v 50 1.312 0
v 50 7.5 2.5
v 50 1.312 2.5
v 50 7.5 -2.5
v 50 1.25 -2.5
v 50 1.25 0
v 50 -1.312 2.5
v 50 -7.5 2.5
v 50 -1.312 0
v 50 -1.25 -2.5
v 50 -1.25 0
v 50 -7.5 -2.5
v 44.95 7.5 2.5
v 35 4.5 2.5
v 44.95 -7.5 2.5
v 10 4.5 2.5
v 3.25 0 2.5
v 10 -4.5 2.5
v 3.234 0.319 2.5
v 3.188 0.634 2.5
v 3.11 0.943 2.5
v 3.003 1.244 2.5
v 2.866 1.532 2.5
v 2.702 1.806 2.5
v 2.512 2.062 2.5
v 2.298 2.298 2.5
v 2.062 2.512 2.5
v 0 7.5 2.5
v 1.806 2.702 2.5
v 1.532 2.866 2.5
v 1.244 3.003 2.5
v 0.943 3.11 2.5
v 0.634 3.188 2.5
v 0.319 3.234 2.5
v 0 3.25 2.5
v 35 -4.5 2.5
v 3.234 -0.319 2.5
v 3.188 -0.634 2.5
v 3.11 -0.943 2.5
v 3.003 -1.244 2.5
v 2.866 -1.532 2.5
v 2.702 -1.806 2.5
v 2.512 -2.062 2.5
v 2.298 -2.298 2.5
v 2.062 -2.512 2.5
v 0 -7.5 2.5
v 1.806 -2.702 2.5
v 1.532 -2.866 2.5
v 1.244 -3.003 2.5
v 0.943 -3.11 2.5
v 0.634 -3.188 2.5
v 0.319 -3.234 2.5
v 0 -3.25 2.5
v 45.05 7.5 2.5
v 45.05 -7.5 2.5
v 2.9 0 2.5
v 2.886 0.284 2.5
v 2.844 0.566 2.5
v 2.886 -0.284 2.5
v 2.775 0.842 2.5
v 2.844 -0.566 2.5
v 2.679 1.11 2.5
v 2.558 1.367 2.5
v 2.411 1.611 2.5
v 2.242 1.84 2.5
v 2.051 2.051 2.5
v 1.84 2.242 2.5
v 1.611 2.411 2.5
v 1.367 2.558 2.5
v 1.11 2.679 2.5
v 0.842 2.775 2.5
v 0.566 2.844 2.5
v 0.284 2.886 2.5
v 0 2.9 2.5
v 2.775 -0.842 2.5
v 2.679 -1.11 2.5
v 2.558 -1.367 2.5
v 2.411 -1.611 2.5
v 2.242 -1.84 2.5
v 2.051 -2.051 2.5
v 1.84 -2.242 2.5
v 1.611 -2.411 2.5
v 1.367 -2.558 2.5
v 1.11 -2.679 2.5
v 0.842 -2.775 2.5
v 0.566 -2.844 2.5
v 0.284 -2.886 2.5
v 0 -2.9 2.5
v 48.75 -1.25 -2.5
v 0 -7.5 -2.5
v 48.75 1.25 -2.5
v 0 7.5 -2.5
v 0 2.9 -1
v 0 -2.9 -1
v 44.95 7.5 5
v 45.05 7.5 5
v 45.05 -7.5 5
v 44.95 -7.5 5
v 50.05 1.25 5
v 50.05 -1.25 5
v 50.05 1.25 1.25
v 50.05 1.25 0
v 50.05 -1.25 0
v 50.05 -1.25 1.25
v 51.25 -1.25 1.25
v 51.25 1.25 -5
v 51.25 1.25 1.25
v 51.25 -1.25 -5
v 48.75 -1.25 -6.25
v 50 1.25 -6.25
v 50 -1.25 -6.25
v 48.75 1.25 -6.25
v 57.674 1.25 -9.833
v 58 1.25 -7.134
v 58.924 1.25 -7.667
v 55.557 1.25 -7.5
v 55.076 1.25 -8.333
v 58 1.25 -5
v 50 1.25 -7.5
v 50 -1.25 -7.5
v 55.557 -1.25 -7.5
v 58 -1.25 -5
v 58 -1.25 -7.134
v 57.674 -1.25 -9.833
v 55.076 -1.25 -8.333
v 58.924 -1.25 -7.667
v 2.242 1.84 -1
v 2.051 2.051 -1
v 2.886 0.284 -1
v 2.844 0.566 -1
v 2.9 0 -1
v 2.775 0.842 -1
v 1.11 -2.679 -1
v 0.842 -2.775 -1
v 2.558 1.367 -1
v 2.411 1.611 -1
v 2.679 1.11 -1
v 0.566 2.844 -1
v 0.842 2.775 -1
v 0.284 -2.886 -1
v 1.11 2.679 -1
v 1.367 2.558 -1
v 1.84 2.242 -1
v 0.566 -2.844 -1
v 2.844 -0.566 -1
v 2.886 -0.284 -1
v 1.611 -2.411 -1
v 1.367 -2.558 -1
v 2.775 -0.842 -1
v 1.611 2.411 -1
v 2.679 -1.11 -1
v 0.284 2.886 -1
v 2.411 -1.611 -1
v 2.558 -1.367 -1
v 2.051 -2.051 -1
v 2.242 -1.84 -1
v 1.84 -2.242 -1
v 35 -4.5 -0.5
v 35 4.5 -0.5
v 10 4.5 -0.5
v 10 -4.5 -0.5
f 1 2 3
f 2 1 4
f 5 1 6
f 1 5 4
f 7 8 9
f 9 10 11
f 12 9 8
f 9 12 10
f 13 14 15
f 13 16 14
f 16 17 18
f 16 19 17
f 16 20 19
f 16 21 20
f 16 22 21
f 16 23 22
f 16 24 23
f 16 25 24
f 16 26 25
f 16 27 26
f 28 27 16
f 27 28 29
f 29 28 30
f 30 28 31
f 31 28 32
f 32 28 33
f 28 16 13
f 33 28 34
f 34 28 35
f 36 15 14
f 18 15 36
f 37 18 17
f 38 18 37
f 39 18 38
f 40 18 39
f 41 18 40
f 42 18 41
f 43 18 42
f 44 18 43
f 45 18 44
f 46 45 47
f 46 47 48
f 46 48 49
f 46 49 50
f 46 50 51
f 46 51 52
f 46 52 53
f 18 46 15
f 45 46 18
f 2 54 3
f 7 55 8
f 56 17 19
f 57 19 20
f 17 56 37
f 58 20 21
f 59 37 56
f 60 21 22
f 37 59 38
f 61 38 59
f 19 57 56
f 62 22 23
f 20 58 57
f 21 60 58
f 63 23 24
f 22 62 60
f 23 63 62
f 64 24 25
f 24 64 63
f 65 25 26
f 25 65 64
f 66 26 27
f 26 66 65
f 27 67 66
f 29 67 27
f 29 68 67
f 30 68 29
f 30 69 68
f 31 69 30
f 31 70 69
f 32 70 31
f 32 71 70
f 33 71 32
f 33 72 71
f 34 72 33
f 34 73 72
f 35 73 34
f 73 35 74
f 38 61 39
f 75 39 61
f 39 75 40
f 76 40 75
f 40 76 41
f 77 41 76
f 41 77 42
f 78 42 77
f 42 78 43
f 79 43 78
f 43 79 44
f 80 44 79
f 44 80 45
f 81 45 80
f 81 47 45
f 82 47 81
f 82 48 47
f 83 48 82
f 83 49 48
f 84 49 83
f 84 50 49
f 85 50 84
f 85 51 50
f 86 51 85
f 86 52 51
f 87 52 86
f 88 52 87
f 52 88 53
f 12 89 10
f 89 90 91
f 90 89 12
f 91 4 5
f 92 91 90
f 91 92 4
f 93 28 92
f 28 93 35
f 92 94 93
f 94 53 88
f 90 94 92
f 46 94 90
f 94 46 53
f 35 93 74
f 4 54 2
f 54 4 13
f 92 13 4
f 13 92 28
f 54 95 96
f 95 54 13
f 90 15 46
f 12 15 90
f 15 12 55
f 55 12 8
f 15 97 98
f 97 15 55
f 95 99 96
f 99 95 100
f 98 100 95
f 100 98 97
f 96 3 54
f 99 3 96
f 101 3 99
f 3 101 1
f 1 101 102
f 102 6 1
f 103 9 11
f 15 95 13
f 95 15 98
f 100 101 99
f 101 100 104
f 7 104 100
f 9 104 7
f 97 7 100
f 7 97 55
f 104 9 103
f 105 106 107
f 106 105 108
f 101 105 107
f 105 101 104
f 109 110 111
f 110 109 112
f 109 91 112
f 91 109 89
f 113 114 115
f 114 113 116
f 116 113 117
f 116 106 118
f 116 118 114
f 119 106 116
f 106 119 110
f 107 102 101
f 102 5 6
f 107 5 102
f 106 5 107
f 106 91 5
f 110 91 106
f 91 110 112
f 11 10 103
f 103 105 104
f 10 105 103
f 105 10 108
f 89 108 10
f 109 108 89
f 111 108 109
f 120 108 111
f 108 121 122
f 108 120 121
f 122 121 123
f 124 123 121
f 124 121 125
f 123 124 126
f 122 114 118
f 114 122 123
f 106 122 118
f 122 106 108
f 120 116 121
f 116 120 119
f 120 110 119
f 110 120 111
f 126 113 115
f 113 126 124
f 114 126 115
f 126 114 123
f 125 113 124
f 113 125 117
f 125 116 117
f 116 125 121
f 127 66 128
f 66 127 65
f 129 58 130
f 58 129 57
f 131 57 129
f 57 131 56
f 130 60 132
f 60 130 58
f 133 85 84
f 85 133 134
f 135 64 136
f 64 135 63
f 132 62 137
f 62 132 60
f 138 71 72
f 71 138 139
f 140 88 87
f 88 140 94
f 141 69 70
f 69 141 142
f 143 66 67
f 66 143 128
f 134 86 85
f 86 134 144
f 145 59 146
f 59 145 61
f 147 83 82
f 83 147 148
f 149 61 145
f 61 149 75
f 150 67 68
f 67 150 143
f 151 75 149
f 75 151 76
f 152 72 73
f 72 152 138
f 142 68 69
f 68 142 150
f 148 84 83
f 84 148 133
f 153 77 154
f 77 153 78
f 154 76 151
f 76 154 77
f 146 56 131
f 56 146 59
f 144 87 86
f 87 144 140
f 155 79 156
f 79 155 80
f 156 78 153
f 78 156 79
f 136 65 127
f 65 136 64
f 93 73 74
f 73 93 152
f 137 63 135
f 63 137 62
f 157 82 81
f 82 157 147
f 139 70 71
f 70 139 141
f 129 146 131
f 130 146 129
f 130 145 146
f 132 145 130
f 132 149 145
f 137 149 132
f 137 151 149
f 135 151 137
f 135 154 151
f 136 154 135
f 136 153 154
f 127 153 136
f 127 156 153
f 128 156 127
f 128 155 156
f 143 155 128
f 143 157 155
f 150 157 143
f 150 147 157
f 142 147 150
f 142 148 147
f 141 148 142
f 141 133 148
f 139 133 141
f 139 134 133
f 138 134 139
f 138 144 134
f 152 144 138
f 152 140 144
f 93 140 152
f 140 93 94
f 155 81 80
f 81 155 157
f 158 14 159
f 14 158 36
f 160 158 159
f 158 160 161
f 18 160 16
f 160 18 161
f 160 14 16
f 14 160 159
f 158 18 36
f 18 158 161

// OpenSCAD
// 挂钩舵机钩子 — MG996R 直驱
// OpenSCAD 打开此文件 → F6 渲染 → Export STL
// 单位: mm

/* ===== 可调参数 ===== */
HOOK_LENGTH    = 50;    // 钩身总长 (舵机轴心→钩尖)
HOOK_WIDTH     = 15;    // 钩身宽度
HOOK_THICK     = 5;     // 钩身厚度 (平放打印)
TIP_DROP       = 10;    // 钩头下探 (Z轴高低差)
TIP_WIDTH      = 2.5;   // 钩尖宽度 (适配3~4mm从车槽口)
TIP_LENGTH     = 8;     // 钩尖长度 (伸入槽口部分)
CURVE_R        = 5;     // 过渡圆弧半径
SHAFT_DIAM     = 5.8;   // 中心孔径 (略小于舵机轴6mm, 压入咬紧)
SCREW_DIAM     = 3.2;   // M3沉头螺丝孔
SCREW_HEAD_DIAM = 6.5;  // M3沉头直径
SCREW_HEAD_DEPTH = 2.5; // M3沉头深度
$fn            = 64;    // 圆弧精度

/* ===== 主模型 ===== */
module hook() {
    difference() {
        union() {
            // —— 钩身平板 ——
            // 舵机轴心在原点，钩子沿 +X 方向伸出
            translate([HOOK_LENGTH/2, 0, 0])
                cube([HOOK_LENGTH, HOOK_WIDTH, HOOK_THICK], center=true);

            // —— 弧形过渡 (宽度渐变: 15→2.5) ——
            // 用 hull() 连接钩身末端和钩尖起点的椭圆截面
            hull() {
                // 钩身末端 (宽15, 厚5)
                translate([HOOK_LENGTH - CURVE_R, 0, HOOK_THICK/2])
                    cube([0.1, HOOK_WIDTH, HOOK_THICK], center=true);
                // 钩尖起点 (宽2.5, 厚5, 下探开始)
                translate([HOOK_LENGTH, 0, HOOK_THICK/2])
                    cube([0.1, TIP_WIDTH, HOOK_THICK], center=true);
            }

            // —— 钩尖下探 (垂直柱) ——
            translate([HOOK_LENGTH, 0, -TIP_DROP/2 + HOOK_THICK/2])
                cube([TIP_WIDTH, TIP_WIDTH, TIP_DROP - HOOK_THICK/2], center=true);

            // —— 钩尖水平段 (伸入槽口的部分) ——
            translate([HOOK_LENGTH + TIP_LENGTH/2, 0, -TIP_DROP + HOOK_THICK/2 + TIP_WIDTH/2])
                cube([TIP_LENGTH, TIP_WIDTH, TIP_WIDTH], center=true);

            // —— 钩尖回钩 (防滑脱的小倒钩) ——
            translate([HOOK_LENGTH + TIP_LENGTH - 1, 0, -TIP_DROP + HOOK_THICK/2 - 0.5])
                rotate([0, 30, 0])
                    cube([3, TIP_WIDTH, TIP_WIDTH], center=true);
        }

        // —— 中心孔 (舵机轴 φ5.8mm) ——
        translate([0, 0, -1])
            cylinder(d=SHAFT_DIAM, h=HOOK_THICK + 2);

        // —— M3 沉头螺丝孔 (从上表面贯穿) ——
        translate([0, 0, HOOK_THICK - SCREW_HEAD_DEPTH])
            cylinder(d=SCREW_HEAD_DIAM, h=SCREW_HEAD_DEPTH + 0.1);
        translate([0, 0, -1])
            cylinder(d=SCREW_DIAM, h=HOOK_THICK + 2);

        // —— 减重槽 (可选, 勾身中间挖空) ——
        translate([HOOK_LENGTH * 0.45, 0, HOOK_THICK/2])
            cube([HOOK_LENGTH * 0.5, HOOK_WIDTH - 6, HOOK_THICK + 1], center=true);
    }
}

// 渲染
hook();

/* ===== 打印说明 =====
 * 摆放: 平放在热床上 (钩身水平, 钩尖朝上悬空)
 *       Z轴层纹垂直于钩身 → 强度最优
 * 支撑: 钩尖下探10mm悬空 → 必须开支撑 (树状支撑, 仅接触热床)
 * 材料: PLA 或 PETG (PETG韧性更好)
 * 填充: 100% (实心)
 * 壁厚: 至少3层 (0.4mm喷嘴 = 1.2mm壁厚)
 */
